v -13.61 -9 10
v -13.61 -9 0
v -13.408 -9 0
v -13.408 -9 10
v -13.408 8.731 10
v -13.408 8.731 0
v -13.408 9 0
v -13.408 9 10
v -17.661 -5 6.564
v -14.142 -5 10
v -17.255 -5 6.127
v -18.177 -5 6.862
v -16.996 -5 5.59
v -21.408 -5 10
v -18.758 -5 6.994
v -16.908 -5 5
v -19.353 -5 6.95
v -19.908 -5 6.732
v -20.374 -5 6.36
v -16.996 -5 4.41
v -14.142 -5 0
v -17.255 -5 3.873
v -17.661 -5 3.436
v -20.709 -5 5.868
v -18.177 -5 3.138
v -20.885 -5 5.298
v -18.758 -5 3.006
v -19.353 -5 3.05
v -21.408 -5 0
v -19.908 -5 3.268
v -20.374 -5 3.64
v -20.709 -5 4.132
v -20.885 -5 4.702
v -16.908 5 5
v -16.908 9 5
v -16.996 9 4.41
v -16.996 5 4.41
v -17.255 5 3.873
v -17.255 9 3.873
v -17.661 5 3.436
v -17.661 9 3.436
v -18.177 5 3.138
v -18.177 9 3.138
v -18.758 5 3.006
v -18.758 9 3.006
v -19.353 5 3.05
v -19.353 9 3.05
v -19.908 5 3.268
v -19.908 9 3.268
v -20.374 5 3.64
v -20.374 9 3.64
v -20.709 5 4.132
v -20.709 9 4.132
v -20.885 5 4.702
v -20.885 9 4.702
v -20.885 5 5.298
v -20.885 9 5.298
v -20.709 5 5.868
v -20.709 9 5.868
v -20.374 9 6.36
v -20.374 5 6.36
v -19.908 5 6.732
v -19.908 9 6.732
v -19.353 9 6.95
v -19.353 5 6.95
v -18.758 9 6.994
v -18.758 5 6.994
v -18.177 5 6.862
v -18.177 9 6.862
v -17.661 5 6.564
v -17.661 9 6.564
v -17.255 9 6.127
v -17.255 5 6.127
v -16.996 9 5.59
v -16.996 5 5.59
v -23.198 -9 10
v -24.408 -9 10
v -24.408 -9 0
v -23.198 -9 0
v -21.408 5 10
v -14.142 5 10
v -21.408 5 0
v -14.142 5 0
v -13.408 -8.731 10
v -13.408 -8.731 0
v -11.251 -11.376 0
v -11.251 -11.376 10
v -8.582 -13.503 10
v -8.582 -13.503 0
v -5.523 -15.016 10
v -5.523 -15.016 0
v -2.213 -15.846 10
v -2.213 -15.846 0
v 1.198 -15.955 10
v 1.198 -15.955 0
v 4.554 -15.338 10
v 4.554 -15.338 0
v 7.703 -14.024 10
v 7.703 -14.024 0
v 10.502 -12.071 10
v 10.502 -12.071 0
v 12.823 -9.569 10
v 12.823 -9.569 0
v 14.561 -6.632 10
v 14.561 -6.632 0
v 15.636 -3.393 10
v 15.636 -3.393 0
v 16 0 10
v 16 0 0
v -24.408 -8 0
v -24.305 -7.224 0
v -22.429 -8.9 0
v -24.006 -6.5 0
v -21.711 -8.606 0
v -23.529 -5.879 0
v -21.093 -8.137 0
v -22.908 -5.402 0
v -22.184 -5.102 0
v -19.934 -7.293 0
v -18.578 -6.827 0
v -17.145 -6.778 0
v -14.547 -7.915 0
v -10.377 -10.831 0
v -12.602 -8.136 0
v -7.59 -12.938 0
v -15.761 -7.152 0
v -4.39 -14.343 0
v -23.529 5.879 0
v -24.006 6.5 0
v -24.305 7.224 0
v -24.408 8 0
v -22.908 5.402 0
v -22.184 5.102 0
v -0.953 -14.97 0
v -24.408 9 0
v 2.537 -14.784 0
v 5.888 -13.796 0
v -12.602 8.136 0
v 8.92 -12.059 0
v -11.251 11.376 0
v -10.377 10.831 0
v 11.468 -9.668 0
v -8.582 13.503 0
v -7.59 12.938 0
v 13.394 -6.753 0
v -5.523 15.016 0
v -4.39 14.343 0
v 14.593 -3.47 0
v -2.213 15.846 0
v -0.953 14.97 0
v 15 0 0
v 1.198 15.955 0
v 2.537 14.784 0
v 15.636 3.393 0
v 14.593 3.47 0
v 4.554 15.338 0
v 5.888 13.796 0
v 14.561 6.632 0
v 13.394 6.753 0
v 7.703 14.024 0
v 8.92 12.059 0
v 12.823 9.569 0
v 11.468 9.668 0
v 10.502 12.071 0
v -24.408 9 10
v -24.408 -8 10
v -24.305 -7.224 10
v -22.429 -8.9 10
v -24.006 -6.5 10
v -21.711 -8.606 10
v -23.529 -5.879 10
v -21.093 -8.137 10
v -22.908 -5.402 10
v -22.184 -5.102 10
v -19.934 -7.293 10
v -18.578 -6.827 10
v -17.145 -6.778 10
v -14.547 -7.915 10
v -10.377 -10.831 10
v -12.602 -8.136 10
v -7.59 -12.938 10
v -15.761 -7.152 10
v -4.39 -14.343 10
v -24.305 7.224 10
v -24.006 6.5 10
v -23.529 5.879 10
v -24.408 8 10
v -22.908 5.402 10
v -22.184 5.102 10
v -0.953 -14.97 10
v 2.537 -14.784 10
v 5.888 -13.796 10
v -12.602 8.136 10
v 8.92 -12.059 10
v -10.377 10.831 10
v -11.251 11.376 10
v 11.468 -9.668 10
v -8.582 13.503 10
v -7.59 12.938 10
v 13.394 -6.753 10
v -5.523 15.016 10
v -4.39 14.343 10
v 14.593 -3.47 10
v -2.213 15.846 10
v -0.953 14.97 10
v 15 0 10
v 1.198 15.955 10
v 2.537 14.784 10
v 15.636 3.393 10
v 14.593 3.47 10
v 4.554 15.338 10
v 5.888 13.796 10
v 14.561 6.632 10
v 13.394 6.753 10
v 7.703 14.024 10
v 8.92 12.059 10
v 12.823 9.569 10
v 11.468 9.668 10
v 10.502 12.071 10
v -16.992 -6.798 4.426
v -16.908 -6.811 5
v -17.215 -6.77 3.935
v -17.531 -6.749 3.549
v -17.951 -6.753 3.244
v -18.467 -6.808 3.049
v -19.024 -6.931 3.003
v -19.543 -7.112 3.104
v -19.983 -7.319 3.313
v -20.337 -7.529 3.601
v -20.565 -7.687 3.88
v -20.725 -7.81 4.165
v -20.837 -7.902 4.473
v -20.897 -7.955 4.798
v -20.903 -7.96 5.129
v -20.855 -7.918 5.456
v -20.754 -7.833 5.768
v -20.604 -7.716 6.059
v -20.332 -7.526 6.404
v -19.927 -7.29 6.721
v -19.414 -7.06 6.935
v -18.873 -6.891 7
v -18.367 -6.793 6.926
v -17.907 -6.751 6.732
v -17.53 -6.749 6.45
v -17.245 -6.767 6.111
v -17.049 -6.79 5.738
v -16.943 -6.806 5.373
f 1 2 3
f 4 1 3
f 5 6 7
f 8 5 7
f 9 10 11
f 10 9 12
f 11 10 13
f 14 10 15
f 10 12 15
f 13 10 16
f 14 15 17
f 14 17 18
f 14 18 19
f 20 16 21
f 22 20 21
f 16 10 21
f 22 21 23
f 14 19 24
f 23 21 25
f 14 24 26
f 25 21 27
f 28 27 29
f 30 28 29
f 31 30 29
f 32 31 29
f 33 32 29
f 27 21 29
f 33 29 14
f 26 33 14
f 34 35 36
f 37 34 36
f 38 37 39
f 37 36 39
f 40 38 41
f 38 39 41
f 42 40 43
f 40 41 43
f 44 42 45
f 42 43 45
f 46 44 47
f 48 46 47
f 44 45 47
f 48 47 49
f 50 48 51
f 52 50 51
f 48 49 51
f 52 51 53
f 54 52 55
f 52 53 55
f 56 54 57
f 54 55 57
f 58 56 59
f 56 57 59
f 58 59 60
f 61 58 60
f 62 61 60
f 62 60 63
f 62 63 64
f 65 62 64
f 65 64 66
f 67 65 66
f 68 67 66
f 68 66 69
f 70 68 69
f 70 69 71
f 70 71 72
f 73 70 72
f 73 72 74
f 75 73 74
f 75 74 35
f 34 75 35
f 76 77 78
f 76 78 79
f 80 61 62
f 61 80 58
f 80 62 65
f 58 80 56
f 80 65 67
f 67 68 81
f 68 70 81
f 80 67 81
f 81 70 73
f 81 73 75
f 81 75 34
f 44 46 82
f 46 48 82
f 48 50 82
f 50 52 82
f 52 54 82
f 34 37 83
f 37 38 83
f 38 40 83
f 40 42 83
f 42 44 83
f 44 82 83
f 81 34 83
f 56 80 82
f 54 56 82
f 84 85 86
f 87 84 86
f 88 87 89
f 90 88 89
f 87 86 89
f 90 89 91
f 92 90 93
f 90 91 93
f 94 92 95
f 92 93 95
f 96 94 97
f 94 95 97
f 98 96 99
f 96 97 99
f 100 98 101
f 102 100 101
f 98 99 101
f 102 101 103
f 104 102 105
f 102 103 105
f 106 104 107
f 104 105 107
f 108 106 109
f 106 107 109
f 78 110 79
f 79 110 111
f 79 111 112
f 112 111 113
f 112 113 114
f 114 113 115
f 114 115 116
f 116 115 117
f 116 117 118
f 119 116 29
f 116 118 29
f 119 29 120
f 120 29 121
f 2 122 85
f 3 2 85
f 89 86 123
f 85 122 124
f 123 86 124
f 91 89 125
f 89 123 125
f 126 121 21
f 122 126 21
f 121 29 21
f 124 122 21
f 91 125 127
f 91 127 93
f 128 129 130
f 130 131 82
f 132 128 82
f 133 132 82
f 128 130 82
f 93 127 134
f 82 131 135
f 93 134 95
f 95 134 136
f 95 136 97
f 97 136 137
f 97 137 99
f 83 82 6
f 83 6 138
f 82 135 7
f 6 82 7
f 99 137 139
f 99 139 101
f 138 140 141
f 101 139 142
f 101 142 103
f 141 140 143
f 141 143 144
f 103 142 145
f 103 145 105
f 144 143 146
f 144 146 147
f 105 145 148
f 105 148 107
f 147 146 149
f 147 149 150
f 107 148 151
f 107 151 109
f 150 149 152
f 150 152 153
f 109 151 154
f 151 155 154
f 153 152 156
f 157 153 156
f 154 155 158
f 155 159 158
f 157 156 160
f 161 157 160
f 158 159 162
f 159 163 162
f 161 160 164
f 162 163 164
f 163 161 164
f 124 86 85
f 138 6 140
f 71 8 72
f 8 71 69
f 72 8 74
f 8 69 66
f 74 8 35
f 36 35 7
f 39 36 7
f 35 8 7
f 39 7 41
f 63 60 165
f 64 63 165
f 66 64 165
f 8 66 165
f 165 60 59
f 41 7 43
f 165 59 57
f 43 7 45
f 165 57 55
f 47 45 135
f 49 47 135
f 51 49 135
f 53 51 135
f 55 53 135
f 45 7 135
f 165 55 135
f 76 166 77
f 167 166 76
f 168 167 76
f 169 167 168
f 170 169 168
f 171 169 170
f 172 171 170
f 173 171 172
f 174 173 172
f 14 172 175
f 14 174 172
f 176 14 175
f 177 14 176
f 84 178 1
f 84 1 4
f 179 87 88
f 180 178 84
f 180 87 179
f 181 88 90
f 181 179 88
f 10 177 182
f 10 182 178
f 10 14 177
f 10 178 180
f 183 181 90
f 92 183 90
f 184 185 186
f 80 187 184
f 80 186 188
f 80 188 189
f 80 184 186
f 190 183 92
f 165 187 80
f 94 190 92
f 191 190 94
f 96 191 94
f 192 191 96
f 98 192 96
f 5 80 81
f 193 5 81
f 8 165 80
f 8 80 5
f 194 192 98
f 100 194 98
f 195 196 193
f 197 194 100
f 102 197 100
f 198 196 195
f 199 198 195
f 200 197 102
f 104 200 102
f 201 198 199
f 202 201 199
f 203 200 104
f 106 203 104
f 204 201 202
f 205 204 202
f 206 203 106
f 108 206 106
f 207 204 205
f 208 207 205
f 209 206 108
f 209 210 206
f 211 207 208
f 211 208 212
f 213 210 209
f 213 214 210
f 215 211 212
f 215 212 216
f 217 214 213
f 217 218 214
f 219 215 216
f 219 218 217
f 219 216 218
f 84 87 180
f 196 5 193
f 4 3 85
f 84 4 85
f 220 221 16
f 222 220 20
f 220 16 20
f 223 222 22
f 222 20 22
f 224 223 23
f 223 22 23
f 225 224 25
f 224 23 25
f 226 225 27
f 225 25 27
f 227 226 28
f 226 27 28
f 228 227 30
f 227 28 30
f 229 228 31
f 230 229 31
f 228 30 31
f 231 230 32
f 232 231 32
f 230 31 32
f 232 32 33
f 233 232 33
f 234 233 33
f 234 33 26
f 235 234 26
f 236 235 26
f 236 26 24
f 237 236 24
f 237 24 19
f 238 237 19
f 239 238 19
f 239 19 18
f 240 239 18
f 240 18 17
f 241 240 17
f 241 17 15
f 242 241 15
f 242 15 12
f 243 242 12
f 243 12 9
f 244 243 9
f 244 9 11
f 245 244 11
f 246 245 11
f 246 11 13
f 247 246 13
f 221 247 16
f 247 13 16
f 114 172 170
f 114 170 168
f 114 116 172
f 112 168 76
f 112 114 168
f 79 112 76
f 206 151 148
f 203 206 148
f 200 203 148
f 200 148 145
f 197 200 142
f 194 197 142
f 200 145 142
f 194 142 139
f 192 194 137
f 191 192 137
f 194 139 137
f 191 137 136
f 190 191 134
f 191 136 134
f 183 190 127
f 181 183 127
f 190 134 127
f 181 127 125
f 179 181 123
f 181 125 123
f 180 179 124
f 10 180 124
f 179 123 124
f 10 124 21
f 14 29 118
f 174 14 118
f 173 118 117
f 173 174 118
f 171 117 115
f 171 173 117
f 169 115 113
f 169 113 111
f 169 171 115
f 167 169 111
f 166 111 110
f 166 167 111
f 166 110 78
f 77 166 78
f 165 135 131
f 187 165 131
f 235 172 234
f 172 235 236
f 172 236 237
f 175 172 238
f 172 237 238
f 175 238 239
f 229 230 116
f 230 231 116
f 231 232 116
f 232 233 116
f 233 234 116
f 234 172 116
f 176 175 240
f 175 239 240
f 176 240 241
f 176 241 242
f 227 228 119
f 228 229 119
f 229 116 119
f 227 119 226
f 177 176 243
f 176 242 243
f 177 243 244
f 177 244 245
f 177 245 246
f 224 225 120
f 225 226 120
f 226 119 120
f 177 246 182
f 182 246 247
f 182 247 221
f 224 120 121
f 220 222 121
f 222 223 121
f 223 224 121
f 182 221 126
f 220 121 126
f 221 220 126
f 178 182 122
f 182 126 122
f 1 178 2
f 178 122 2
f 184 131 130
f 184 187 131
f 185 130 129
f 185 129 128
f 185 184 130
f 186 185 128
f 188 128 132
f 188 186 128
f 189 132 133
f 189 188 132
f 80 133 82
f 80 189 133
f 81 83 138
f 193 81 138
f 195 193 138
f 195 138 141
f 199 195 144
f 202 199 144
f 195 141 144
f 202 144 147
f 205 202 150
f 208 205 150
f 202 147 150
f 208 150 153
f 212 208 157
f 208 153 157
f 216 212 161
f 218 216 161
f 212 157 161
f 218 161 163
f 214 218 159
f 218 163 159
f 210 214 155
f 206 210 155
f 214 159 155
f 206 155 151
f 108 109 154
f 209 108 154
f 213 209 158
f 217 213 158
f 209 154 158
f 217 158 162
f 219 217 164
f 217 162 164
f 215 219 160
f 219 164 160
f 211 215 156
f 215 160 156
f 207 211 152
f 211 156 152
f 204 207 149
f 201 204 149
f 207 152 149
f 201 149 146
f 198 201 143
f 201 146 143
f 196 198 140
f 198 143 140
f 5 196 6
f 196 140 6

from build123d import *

# Parameters (mm, degrees)
SALIENTE_EXTRUIR4_DEPTH = 10
REDONDEO4_R             = 3
CROQUIS4_R              = 2
CORTAR_EXTRUIR1_DEPTH   = 21
CROQUIS5_R              = 4.836264875
CORTAR_EXTRUIR2_DEPTH   = 21
REDONDEO5_R             = 3


with BuildPart() as part:
    # Croquis1 → Saliente-Extruir4 (new body)
    with BuildSketch(Plane.XY):
        with BuildLine():
            ThreePointArc((-15.198684154, 5), (-14.424283954, 6.923874089), (-13.407545238, 8.731422032))
            Line((-13.407545238, 8.731422032), (-13.407545238, 9))
            Line((-13.407545238, 9), (-24.407545238, 9))
            Line((-24.407545238, 9), (-24.407545238, 5))
            Line((-24.407545238, 5), (-15.198684154, 5))
        make_face()
        with BuildLine():
            Line((15, 0), (16, 0))
            ThreePointArc((16, 0), (4.554079281, 15.338199435), (-13.407545238, 8.731422032))
            ThreePointArc((-13.407545238, 8.731422032), (-14.424283954, 6.923874089), (-15.198684154, 5))
            Line((-15.198684154, 5), (-14.142135624, 5))
            ThreePointArc((-14.142135624, 5), (2.536529681, 14.783978395), (15, 0))
        make_face()
        with BuildLine():
            Line((-13.407545238, -9), (-13.407545238, -8.731422032))
            ThreePointArc((-13.407545238, -8.731422032), (-14.424283954, -6.923874089), (-15.198684154, -5))
            Line((-15.198684154, -5), (-24.407545238, -5))
            Line((-24.407545238, -5), (-24.407545238, -9))
            Line((-24.407545238, -9), (-13.407545238, -9))
        make_face()
        with BuildLine():
            ThreePointArc((-13.407545238, -8.731422032), (4.554079281, -15.338199435), (16, 0))
            Line((16, 0), (15, 0))
            ThreePointArc((15, 0), (2.536529681, -14.783978395), (-14.142135624, -5))
            Line((-14.142135624, -5), (-15.198684154, -5))
            ThreePointArc((-15.198684154, -5), (-14.424283954, -6.923874089), (-13.407545238, -8.731422032))
        make_face()
    extrude(amount=SALIENTE_EXTRUIR4_DEPTH)

    # Redondeo4
    redondeo4_edges = [part.edges().sort_by_distance(p)[0] for p in [
        (-24.407545238, 5, 5),
        (-24.407545238, -5, 5),
    ]]
    fillet(redondeo4_edges, radius=REDONDEO4_R)

    # Croquis4 → Cortar-Extruir1 (cut)
    with BuildSketch(Plane(origin=(0, 9, 0), x_dir=(1, 0, 0), z_dir=(0, 1, 0))):
        with Locations((-18.907545238, -5)):
            Circle(CROQUIS4_R)
    extrude(amount=-CORTAR_EXTRUIR1_DEPTH, mode=Mode.SUBTRACT)

    # Croquis5 → Cortar-Extruir2 (cut)
    with BuildSketch(Plane(origin=(0, 0, 0), x_dir=(-1, 0, 0), z_dir=(0, 0, -1))):
        with Locations((17.698992991, -11.582378958)):
            Circle(CROQUIS5_R)
    extrude(amount=-CORTAR_EXTRUIR2_DEPTH, mode=Mode.SUBTRACT)

    # Redondeo5
    redondeo5_edges = [part.edges().sort_by_distance(p)[0] for p in [
        (-21.788097643, -9, 5),
    ]]
    fillet(redondeo5_edges, radius=REDONDEO5_R)


solid = part.part
